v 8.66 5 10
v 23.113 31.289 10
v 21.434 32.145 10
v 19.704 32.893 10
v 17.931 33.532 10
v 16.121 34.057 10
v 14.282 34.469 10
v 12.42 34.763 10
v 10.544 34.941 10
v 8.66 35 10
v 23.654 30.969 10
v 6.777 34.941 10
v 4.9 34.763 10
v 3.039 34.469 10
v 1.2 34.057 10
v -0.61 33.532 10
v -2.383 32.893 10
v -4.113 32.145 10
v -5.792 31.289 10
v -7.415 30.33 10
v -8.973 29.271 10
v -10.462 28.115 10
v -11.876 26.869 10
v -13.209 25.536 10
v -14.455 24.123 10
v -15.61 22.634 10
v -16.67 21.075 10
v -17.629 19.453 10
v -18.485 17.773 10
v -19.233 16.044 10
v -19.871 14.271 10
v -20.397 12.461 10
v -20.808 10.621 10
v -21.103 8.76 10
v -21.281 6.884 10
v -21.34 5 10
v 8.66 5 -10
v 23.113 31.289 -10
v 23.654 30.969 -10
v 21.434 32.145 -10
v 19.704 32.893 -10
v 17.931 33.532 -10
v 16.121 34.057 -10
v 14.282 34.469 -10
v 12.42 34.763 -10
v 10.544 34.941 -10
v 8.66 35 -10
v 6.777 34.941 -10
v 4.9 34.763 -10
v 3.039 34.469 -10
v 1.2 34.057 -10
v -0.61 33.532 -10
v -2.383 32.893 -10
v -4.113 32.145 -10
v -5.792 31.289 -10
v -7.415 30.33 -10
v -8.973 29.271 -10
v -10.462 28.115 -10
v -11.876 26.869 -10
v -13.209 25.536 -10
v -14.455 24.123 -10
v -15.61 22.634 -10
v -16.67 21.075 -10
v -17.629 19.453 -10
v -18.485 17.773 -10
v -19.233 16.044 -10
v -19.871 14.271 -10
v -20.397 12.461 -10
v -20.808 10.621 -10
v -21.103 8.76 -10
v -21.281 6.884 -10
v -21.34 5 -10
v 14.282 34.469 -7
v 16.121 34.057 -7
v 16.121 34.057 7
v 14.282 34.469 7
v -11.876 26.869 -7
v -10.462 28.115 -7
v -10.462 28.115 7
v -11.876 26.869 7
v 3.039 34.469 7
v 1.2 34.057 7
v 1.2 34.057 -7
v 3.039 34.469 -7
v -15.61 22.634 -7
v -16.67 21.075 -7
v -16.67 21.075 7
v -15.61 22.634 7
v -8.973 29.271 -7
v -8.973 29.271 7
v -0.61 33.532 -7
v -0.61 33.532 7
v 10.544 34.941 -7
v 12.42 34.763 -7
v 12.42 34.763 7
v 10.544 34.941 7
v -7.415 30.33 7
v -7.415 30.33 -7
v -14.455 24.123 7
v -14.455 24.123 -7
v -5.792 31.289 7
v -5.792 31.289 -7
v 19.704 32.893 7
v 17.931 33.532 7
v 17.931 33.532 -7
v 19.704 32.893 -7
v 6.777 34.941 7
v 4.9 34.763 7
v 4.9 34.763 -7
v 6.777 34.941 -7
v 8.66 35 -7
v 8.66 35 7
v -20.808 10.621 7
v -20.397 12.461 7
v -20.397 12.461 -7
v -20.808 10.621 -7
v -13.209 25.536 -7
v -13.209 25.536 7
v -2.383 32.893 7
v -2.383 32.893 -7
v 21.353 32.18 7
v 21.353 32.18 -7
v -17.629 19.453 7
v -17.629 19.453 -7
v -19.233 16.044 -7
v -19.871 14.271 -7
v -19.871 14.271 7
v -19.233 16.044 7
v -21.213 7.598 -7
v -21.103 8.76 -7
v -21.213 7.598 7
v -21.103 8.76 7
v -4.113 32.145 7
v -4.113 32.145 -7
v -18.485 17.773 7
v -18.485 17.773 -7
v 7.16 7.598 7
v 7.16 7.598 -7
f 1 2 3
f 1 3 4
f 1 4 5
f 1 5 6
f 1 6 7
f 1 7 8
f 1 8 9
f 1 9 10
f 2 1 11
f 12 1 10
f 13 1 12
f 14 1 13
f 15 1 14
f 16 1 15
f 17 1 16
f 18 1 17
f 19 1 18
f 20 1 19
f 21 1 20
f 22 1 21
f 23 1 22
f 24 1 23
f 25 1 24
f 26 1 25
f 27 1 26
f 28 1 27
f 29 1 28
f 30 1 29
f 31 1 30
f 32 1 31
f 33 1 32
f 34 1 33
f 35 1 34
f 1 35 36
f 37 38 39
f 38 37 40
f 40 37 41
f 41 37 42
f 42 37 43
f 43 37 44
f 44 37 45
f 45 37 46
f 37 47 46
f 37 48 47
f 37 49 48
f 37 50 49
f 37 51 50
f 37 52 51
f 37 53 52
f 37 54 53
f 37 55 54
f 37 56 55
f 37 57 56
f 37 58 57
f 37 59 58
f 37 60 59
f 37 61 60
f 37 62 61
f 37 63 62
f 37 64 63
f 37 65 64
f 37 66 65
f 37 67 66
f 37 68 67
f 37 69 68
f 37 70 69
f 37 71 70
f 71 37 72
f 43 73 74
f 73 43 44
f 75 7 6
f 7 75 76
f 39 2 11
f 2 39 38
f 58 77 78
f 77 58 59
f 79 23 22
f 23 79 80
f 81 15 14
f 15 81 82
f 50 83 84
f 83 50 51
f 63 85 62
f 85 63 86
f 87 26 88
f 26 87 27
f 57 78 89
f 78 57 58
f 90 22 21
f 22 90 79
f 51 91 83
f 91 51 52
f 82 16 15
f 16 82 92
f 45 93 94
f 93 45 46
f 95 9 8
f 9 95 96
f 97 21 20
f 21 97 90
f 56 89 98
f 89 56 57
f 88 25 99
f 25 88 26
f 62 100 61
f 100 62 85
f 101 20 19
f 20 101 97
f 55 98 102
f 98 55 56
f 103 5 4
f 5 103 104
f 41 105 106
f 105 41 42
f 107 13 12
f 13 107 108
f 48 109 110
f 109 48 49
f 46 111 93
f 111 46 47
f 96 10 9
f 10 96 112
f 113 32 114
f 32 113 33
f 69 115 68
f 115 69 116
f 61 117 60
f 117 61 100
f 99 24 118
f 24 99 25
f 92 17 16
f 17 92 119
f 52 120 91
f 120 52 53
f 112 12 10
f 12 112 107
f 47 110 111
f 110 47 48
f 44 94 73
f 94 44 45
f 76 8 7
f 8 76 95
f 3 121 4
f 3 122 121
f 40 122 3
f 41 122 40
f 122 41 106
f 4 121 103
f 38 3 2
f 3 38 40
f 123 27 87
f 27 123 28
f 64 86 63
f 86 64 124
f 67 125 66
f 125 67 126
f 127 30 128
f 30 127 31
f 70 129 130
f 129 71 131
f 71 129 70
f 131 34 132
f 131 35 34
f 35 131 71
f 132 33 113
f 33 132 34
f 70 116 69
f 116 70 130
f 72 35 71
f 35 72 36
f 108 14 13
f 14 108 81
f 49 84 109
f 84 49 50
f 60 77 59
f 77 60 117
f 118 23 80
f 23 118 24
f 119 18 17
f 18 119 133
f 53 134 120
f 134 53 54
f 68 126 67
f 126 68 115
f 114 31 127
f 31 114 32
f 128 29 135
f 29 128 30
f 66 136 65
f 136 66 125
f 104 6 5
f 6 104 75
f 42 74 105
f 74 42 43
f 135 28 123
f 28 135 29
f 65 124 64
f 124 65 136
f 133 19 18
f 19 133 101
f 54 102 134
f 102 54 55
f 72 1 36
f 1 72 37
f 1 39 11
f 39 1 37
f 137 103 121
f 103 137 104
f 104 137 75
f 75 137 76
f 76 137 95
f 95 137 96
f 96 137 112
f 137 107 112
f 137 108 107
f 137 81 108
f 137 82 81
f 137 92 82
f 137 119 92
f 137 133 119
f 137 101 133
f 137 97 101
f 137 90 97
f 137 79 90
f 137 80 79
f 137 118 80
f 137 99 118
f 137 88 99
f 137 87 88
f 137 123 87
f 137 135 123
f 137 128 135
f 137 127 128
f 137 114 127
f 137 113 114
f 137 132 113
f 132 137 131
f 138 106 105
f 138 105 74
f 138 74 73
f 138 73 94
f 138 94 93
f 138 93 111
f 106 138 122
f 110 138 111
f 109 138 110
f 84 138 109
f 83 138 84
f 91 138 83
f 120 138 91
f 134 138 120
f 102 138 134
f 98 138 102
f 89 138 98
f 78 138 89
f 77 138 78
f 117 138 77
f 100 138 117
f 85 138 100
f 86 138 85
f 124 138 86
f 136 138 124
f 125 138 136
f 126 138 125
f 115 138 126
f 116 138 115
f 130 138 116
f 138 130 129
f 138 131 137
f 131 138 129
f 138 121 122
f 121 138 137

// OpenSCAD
perfil=20;
extensiOn=2;
resoluciOn=100;
angulo=60;




module redondeador(perfil=20,extensiOn=3,resoluciOn=100,espesor=0){
    
    //El círculo del redondeador se encuentra en el centro
difference(){
  translate([0,perfil/2,0])
  cube([perfil*extensiOn,perfil*extensiOn,perfil-2*(espesor)],center=true);
   cylinder(r=perfil*(extensiOn/2),$fn=resoluciOn,h=perfil,center=true);   
  }

}


//redondeador();


module pizza(perfil=20,extensiOn=2,resoluciOn=100,angulo=60,espesor=0){

difference(){
  //translate([0,perfil/2,0])
  difference(){
      //el cubo a redondear se debe mover el valor del radio del círculo redondeador
      translate([0,perfil*(extensiOn/4),0])
    cube([perfil*extensiOn,perfil*(extensiOn/2),perfil-2*(espesor)],center=true);
    
  redondeador(perfil=perfil,extensiOn=extensiOn,resoluciOn=resoluciOn,espesor=espesor);
 }
 
rotate(angulo)
  translate([perfil*extensiOn,-perfil*extensiOn,0])
 cube([perfil*extensiOn*2,perfil*extensiOn*2,perfil],center=true);
 
 }
 
 }
 
 
  

module semiCil(espesor=3,perfil=20,extensiOn=3,resoluciOn=100,angulo=60){
    mueveY=sin(60)*espesor;
 mueveX=cos(60)*espesor;
    
difference(){
     //Pizza grande
 pizza(perfil=perfil,extensiOn=extensiOn,resoluciOn=resoluciOn,angulo=angulo);
 translate([-mueveX,mueveY,0])
 //talandro
 pizza(perfil=perfil,extensiOn=extensiOn,resoluciOn=resoluciOn,angulo=angulo,espesor=espesor);
 }
 }

 
mueveY=cos(60)*perfil;
 mueveX=sin(60)*perfil;
 

translate([mueveX/2,mueveY/2,0])
 semiCil(espesor=3,perfil=20,extensiOn=3,resoluciOn=100,angulo=60);
 /*
 ajuste=0.77;
 translate([ajuste,-perfil/4,0])
cube([perfil/2,perfil/2,perfil],center=true);
 
 
 rotate(150)
  translate([-perfil/4,ajuste,0])
cube([perfil/2,perfil/2,perfil],center=true);
 */
 
 

 

 
 
